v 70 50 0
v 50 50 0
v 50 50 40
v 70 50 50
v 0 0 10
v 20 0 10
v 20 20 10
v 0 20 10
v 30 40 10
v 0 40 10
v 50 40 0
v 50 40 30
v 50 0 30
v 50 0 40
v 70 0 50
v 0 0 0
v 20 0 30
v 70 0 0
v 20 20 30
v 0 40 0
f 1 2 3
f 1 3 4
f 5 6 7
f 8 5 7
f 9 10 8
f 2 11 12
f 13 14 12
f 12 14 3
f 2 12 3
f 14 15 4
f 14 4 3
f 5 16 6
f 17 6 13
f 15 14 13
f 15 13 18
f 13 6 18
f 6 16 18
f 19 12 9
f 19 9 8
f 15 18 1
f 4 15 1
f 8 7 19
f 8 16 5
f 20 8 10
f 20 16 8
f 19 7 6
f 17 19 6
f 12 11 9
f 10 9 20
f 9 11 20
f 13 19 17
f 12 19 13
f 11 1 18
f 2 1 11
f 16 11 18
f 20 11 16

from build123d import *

# Parameters (mm, degrees)
SKETCH1_W            = 70
SKETCH1_H            = 50
BOSS_EXTRUDE1_DEPTH  = 50
SKETCH2_W            = 50
SKETCH2_H            = 10
CUT_EXTRUDE1_DEPTH   = 50
SKETCH3_W            = 50
SKETCH3_H            = 40
CUT_EXTRUDE2_DEPTH   = 40
CUT_EXTRUDE6_DEPTH   = 20
BOSS_EXTRUDE9_DEPTH  = 20
BOSS_EXTRUDE10_DEPTH = 20
SKETCH11_W           = 20
SKETCH11_H           = 20
CUT_EXTRUDE7_DEPTH   = 20
BOSS_EXTRUDE12_DEPTH = 10
BOSS_EXTRUDE13_DEPTH = 10
CUT_EXTRUDE8_DEPTH   = 68


with BuildPart() as part:
    # Sketch1 → Boss-Extrude1 (new body)
    with BuildSketch(Plane.XY):
        with Locations((35, 25)):
            Rectangle(SKETCH1_W, SKETCH1_H)
    extrude(amount=BOSS_EXTRUDE1_DEPTH)

    # Sketch2 → Cut-Extrude1 (cut)
    with BuildSketch(Plane.XY.offset(50)):
        with Locations((25, 45)):
            Rectangle(SKETCH2_W, SKETCH2_H)
    extrude(amount=-CUT_EXTRUDE1_DEPTH, mode=Mode.SUBTRACT)

    # Sketch3 → Cut-Extrude2 (cut)
    with BuildSketch(Plane.XY.offset(50)):
        with Locations((25, 20)):
            Rectangle(SKETCH3_W, SKETCH3_H)
    extrude(amount=-CUT_EXTRUDE2_DEPTH, mode=Mode.SUBTRACT)

    # Sketch8 → Cut-Extrude6 (cut)
    with BuildSketch(Plane.XY.offset(10)):
        Polygon((30, 40), (0, 20), (20, 20), (50, 40), align=None)
    extrude(amount=-CUT_EXTRUDE6_DEPTH, mode=Mode.SUBTRACT)

    # Sketch9 → Boss-Extrude9 (add)
    with BuildSketch(Plane.XY.offset(10)):
        Polygon((50, 40), (20, 20), (20, 0), (50, 0), align=None)
    extrude(amount=BOSS_EXTRUDE9_DEPTH)

    # Sketch10 → Boss-Extrude10 (add)
    with BuildSketch(Plane(origin=(-9.411764706, 14.117647059, 9.411764706), x_dir=(0.874474632, 0.403603676, 0.269069118), z_dir=(-0.48507125, 0.727606875, 0.48507125))):
        Polygon((45.069077198, 13.867504906), (67.939952194, -2.773500981), (33.6336397, -13.867504906), (10.762764704, 2.773500981), align=None)
    extrude(amount=-BOSS_EXTRUDE10_DEPTH)

    # Sketch11 → Cut-Extrude7 (cut)
    with BuildSketch(Plane.ZY.offset(-20)):
        with Locations((20, 10)):
            Rectangle(SKETCH11_W, SKETCH11_H)
    extrude(amount=CUT_EXTRUDE7_DEPTH, mode=Mode.SUBTRACT)

    # Sketch12 → Boss-Extrude12 (add)
    with BuildSketch(Plane(origin=(0, 0, 0), x_dir=(-1, 0, 0), z_dir=(0, 0, -1))):
        Polygon((-50, 40), (-20, 20), (0, 20), (-30, 40), align=None)
    extrude(amount=-BOSS_EXTRUDE12_DEPTH)

    # Sketch13 → Boss-Extrude13 (add)
    with BuildSketch(Plane(origin=(0, 40, 0), x_dir=(1, 0, 0), z_dir=(0, 1, 0))):
        Polygon((30, -10), (50, -10), (50, -30), align=None)
    extrude(amount=-BOSS_EXTRUDE13_DEPTH)

    # Sketch14 → Cut-Extrude8 (cut)
    with BuildSketch(Plane(origin=(0, 50, 0), x_dir=(1, 0, 0), z_dir=(0, 1, 0))):
        Polygon((70, -50), (50, -40), (50, -50), align=None)
    extrude(amount=-CUT_EXTRUDE8_DEPTH, mode=Mode.SUBTRACT)


solid = part.part
